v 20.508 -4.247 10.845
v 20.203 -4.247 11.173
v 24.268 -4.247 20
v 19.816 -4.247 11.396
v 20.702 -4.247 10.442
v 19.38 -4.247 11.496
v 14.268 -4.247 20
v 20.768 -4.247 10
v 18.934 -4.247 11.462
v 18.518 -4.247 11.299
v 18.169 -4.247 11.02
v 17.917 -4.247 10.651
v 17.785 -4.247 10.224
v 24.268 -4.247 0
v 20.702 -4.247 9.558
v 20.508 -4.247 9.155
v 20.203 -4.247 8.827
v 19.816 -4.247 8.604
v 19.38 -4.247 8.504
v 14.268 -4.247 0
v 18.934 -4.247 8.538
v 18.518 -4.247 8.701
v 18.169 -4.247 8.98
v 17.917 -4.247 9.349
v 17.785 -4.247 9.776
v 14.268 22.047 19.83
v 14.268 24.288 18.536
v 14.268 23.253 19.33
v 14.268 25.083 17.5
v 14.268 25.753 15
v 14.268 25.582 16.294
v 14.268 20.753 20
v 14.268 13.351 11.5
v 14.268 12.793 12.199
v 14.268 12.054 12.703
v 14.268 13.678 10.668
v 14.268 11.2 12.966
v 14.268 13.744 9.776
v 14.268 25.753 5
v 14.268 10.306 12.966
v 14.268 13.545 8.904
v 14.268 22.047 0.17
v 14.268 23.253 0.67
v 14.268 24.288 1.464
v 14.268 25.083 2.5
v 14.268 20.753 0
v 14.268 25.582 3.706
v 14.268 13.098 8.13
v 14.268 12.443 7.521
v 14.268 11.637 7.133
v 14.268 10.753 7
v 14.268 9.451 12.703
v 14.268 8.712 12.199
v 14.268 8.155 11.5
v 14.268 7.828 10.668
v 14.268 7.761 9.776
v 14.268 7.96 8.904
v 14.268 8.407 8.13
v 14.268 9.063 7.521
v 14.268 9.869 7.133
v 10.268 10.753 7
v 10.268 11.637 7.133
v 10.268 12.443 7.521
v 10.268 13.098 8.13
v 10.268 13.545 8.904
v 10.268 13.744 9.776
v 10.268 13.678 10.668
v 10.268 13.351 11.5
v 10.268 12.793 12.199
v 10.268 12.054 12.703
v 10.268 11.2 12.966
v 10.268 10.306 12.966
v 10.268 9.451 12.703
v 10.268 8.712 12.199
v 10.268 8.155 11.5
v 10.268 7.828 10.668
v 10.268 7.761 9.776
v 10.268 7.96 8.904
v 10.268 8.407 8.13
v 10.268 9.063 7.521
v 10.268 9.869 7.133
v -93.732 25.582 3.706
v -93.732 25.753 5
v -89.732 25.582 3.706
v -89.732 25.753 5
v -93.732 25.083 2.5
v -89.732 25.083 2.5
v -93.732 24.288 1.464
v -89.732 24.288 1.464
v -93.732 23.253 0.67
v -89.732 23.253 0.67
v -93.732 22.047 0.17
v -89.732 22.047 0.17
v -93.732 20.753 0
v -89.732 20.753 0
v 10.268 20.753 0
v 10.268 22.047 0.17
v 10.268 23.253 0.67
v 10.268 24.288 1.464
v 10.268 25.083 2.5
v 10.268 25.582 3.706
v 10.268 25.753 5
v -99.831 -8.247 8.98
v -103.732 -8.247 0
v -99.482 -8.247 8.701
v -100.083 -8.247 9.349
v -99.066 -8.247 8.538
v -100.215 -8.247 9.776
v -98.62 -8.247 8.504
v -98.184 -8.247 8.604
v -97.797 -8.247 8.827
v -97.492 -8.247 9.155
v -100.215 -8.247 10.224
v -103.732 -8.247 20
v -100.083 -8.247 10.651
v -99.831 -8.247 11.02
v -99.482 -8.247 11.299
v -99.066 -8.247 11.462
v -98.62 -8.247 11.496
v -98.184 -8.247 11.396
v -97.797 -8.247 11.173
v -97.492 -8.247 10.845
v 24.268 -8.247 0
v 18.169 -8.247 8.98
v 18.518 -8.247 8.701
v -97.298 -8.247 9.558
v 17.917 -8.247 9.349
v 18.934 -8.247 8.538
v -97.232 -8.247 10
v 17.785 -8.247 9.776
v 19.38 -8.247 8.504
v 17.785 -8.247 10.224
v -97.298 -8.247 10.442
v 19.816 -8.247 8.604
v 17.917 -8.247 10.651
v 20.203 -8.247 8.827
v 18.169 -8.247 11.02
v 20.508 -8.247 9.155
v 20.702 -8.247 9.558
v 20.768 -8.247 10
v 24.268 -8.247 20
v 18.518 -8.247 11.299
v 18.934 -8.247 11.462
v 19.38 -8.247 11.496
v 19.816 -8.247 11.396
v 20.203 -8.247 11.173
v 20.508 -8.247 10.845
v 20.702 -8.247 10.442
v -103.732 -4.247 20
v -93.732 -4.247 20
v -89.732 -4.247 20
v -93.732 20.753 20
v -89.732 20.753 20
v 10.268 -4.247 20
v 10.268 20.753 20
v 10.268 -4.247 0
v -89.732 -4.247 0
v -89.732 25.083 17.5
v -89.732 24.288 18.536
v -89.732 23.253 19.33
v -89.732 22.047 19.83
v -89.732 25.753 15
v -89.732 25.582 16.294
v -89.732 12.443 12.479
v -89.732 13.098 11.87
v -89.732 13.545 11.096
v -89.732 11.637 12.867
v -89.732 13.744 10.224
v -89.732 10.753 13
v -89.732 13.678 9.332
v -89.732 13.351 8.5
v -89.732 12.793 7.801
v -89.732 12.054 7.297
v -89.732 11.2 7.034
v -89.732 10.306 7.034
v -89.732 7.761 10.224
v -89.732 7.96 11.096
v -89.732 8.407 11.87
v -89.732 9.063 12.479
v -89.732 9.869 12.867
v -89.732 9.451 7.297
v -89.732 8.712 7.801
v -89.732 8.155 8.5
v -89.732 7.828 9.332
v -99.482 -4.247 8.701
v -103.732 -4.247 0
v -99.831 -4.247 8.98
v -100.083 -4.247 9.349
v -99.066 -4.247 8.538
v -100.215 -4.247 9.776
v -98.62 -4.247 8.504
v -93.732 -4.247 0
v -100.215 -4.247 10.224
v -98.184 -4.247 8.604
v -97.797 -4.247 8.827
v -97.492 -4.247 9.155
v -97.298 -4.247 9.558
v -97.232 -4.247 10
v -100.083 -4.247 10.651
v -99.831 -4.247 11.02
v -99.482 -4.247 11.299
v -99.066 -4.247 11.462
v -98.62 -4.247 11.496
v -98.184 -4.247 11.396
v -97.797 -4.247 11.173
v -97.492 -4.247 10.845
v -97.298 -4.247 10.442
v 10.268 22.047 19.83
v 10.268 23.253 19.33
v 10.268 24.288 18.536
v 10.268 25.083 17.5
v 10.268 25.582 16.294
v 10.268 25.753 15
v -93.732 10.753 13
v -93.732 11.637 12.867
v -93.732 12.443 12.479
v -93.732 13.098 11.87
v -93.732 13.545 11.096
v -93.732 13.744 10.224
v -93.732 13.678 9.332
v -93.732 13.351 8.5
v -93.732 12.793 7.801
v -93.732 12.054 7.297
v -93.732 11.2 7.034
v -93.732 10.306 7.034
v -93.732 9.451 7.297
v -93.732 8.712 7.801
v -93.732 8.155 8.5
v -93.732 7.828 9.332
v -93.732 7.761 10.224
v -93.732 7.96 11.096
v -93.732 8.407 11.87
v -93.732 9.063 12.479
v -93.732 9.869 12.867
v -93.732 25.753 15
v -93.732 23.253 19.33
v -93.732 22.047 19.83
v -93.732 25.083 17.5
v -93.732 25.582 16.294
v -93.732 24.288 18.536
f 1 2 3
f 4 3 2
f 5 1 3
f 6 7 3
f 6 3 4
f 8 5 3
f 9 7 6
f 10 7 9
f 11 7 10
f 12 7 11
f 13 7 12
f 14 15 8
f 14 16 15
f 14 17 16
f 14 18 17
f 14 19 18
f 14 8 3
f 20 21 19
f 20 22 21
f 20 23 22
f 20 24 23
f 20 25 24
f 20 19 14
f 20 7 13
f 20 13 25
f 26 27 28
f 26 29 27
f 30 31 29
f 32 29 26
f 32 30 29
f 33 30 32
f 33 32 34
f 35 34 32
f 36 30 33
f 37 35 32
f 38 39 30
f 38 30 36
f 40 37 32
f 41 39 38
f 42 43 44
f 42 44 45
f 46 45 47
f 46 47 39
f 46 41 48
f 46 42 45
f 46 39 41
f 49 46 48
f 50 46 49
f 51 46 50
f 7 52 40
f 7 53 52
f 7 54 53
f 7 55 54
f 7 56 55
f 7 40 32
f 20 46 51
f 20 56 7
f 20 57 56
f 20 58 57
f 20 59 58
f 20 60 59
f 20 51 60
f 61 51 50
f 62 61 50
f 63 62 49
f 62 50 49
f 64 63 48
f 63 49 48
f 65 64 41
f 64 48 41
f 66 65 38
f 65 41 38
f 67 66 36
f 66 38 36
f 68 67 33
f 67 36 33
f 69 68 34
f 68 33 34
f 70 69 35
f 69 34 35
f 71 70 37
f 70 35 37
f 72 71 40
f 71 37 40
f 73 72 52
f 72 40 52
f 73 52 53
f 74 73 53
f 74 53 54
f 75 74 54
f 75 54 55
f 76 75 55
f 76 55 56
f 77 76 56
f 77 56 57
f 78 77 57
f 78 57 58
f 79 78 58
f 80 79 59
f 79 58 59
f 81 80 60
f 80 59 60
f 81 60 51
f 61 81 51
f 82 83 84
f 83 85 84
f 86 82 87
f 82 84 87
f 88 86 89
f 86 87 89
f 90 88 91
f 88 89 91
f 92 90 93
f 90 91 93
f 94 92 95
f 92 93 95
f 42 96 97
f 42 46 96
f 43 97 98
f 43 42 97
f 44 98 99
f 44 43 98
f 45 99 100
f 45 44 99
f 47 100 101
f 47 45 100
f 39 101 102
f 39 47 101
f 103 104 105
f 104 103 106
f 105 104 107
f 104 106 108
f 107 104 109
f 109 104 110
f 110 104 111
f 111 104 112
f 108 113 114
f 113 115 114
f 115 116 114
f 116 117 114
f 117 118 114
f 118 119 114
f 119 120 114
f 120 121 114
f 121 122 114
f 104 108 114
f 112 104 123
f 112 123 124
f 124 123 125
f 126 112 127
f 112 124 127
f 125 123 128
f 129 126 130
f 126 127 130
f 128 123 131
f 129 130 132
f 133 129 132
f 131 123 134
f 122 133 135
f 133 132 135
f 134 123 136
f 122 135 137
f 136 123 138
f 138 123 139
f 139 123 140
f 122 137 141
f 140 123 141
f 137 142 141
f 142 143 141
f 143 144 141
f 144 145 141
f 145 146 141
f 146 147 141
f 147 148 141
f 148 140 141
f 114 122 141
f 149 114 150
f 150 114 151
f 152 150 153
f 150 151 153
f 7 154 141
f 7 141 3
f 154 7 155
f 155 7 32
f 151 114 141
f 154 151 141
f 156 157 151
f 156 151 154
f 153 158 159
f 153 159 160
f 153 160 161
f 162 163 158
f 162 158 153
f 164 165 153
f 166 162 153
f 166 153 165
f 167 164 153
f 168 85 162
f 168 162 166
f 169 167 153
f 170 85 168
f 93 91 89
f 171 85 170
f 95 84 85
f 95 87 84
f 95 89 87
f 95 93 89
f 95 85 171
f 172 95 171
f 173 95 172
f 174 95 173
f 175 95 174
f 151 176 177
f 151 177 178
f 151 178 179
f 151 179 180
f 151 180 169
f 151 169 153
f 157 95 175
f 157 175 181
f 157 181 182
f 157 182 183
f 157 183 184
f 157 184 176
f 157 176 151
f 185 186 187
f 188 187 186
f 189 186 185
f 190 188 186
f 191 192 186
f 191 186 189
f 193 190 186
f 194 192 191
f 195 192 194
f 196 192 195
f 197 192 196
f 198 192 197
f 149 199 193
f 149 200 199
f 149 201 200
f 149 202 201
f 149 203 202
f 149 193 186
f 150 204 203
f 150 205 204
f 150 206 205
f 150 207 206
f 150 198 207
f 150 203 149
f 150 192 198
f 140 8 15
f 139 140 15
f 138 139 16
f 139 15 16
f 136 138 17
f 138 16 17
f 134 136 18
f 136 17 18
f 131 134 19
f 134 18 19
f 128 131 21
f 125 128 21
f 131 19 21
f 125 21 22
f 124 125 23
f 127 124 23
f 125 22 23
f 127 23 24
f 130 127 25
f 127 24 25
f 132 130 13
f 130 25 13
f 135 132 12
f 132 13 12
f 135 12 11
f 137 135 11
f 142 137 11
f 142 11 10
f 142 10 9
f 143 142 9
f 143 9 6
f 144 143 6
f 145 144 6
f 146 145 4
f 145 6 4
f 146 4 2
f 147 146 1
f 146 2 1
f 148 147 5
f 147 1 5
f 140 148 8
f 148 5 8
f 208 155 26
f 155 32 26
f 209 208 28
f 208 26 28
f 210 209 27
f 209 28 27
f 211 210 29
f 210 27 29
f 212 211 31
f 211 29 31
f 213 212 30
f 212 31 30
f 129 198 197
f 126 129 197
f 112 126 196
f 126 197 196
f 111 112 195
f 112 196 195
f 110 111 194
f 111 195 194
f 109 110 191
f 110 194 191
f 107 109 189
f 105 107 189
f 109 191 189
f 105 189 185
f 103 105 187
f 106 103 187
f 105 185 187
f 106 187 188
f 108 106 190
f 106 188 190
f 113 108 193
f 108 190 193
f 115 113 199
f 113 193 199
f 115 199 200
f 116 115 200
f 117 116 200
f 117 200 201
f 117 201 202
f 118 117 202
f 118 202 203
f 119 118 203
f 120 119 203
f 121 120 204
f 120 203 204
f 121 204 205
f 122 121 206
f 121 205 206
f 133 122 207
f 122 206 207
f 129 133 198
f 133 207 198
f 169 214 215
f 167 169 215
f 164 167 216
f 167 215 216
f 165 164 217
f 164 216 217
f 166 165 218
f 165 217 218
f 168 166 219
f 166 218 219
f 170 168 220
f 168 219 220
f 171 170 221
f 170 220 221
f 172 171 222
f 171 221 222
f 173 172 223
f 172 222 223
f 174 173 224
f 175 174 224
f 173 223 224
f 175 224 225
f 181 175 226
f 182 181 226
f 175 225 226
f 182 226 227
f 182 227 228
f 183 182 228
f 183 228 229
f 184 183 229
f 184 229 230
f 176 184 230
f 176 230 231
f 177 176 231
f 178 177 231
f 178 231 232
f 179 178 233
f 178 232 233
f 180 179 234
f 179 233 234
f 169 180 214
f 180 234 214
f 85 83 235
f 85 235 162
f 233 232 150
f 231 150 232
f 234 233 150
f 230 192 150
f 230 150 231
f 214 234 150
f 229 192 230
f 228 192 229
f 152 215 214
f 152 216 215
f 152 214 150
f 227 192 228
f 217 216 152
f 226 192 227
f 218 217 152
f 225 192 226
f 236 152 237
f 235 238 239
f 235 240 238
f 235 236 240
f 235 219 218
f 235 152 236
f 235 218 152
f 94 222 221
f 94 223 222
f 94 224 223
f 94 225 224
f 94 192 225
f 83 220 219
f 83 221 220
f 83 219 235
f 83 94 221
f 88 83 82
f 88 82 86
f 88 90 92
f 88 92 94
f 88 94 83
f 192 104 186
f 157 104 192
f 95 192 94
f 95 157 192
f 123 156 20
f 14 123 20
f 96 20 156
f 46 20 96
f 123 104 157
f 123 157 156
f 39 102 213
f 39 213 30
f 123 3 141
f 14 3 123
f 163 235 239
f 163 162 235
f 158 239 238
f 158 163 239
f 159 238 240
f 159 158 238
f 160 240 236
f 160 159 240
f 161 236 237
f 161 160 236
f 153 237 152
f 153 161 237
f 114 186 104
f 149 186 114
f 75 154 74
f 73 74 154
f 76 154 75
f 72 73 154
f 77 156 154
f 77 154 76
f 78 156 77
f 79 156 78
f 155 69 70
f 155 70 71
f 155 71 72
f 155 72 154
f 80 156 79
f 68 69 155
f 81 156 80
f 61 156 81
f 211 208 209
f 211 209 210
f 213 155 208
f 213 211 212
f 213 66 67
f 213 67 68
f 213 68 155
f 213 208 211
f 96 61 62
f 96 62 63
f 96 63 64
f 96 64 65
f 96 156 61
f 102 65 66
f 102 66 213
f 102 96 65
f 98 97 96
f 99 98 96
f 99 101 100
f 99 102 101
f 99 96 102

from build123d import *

# Parameters (mm, degrees)
BOSS_EXTRUDE1_DEPTH = 20
SKETCH2_R           = 3
CUT_EXTRUDE1_DEPTH  = 4
SKETCH3_R           = 3
CUT_EXTRUDE2_DEPTH  = 4
FILLET1_R           = 5
SKETCH4_W           = 20
SKETCH4_H           = 4
BOSS_EXTRUDE2_DEPTH = 10
SKETCH5_W           = 20
SKETCH5_H           = 4
BOSS_EXTRUDE3_DEPTH = 10
SKETCH6_R           = 1.5
CUT_EXTRUDE3_DEPTH  = 4


with BuildPart() as part:
    # Sketch1 → Boss-Extrude1 (new body)
    with BuildSketch(Plane.XY):
        Polygon((-89.731830747, 25.752777778), (-89.731830747, -4.247222222), (10.268169253, -4.247222222), (10.268169253, 25.752777778), (14.268169253, 25.752777778), (14.268169253, -8.247222222), (-93.731830747, -8.247222222), (-93.731830747, 25.752777778), align=None)
    extrude(amount=BOSS_EXTRUDE1_DEPTH)

    # Sketch2 → Cut-Extrude1 (cut)
    with BuildSketch(Plane.ZY.offset(93.731830747)):
        with Locations((10, 10.752777778)):
            Circle(SKETCH2_R)
    extrude(amount=-CUT_EXTRUDE1_DEPTH, mode=Mode.SUBTRACT)

    # Sketch3 → Cut-Extrude2 (cut)
    with BuildSketch(Plane(origin=(14.268169253, 0, 0), x_dir=(0, 0, -1), z_dir=(1, 0, 0))):
        with Locations((-10, 10.752777778)):
            Circle(SKETCH3_R)
    extrude(amount=-CUT_EXTRUDE2_DEPTH, mode=Mode.SUBTRACT)

    # Fillet1
    fillet1_edges = [part.edges().sort_by_distance(p)[0] for p in [
        (-91.731830747, 25.752777778, 0),
        (12.268169253, 25.752777778, 20),
        (-91.731830747, 25.752777778, 20),
        (12.268169253, 25.752777778, 0),
    ]]
    fillet(fillet1_edges, radius=FILLET1_R)

    # Sketch4 → Boss-Extrude2 (add)
    with BuildSketch(Plane(origin=(14.268169253, 0, 0), x_dir=(0, 0, -1), z_dir=(1, 0, 0))):
        with Locations((-10, -6.247222222)):
            Rectangle(SKETCH4_W, SKETCH4_H)
    extrude(amount=BOSS_EXTRUDE2_DEPTH)

    # Sketch5 → Boss-Extrude3 (add)
    with BuildSketch(Plane.ZY.offset(93.731830747)):
        with Locations((10, -6.247222222)):
            Rectangle(SKETCH5_W, SKETCH5_H)
    extrude(amount=BOSS_EXTRUDE3_DEPTH)

    # Sketch6 → Cut-Extrude3 (cut)
    with BuildSketch(Plane(origin=(0, -4.247222222, 0), x_dir=(1, 0, 0), z_dir=(0, 1, 0))):
        with Locations((-98.731830747, -10)):
            Circle(SKETCH6_R)
        with Locations((19.268169253, -10)):
            Circle(SKETCH6_R)
    extrude(amount=-CUT_EXTRUDE3_DEPTH, mode=Mode.SUBTRACT)


solid = part.part
